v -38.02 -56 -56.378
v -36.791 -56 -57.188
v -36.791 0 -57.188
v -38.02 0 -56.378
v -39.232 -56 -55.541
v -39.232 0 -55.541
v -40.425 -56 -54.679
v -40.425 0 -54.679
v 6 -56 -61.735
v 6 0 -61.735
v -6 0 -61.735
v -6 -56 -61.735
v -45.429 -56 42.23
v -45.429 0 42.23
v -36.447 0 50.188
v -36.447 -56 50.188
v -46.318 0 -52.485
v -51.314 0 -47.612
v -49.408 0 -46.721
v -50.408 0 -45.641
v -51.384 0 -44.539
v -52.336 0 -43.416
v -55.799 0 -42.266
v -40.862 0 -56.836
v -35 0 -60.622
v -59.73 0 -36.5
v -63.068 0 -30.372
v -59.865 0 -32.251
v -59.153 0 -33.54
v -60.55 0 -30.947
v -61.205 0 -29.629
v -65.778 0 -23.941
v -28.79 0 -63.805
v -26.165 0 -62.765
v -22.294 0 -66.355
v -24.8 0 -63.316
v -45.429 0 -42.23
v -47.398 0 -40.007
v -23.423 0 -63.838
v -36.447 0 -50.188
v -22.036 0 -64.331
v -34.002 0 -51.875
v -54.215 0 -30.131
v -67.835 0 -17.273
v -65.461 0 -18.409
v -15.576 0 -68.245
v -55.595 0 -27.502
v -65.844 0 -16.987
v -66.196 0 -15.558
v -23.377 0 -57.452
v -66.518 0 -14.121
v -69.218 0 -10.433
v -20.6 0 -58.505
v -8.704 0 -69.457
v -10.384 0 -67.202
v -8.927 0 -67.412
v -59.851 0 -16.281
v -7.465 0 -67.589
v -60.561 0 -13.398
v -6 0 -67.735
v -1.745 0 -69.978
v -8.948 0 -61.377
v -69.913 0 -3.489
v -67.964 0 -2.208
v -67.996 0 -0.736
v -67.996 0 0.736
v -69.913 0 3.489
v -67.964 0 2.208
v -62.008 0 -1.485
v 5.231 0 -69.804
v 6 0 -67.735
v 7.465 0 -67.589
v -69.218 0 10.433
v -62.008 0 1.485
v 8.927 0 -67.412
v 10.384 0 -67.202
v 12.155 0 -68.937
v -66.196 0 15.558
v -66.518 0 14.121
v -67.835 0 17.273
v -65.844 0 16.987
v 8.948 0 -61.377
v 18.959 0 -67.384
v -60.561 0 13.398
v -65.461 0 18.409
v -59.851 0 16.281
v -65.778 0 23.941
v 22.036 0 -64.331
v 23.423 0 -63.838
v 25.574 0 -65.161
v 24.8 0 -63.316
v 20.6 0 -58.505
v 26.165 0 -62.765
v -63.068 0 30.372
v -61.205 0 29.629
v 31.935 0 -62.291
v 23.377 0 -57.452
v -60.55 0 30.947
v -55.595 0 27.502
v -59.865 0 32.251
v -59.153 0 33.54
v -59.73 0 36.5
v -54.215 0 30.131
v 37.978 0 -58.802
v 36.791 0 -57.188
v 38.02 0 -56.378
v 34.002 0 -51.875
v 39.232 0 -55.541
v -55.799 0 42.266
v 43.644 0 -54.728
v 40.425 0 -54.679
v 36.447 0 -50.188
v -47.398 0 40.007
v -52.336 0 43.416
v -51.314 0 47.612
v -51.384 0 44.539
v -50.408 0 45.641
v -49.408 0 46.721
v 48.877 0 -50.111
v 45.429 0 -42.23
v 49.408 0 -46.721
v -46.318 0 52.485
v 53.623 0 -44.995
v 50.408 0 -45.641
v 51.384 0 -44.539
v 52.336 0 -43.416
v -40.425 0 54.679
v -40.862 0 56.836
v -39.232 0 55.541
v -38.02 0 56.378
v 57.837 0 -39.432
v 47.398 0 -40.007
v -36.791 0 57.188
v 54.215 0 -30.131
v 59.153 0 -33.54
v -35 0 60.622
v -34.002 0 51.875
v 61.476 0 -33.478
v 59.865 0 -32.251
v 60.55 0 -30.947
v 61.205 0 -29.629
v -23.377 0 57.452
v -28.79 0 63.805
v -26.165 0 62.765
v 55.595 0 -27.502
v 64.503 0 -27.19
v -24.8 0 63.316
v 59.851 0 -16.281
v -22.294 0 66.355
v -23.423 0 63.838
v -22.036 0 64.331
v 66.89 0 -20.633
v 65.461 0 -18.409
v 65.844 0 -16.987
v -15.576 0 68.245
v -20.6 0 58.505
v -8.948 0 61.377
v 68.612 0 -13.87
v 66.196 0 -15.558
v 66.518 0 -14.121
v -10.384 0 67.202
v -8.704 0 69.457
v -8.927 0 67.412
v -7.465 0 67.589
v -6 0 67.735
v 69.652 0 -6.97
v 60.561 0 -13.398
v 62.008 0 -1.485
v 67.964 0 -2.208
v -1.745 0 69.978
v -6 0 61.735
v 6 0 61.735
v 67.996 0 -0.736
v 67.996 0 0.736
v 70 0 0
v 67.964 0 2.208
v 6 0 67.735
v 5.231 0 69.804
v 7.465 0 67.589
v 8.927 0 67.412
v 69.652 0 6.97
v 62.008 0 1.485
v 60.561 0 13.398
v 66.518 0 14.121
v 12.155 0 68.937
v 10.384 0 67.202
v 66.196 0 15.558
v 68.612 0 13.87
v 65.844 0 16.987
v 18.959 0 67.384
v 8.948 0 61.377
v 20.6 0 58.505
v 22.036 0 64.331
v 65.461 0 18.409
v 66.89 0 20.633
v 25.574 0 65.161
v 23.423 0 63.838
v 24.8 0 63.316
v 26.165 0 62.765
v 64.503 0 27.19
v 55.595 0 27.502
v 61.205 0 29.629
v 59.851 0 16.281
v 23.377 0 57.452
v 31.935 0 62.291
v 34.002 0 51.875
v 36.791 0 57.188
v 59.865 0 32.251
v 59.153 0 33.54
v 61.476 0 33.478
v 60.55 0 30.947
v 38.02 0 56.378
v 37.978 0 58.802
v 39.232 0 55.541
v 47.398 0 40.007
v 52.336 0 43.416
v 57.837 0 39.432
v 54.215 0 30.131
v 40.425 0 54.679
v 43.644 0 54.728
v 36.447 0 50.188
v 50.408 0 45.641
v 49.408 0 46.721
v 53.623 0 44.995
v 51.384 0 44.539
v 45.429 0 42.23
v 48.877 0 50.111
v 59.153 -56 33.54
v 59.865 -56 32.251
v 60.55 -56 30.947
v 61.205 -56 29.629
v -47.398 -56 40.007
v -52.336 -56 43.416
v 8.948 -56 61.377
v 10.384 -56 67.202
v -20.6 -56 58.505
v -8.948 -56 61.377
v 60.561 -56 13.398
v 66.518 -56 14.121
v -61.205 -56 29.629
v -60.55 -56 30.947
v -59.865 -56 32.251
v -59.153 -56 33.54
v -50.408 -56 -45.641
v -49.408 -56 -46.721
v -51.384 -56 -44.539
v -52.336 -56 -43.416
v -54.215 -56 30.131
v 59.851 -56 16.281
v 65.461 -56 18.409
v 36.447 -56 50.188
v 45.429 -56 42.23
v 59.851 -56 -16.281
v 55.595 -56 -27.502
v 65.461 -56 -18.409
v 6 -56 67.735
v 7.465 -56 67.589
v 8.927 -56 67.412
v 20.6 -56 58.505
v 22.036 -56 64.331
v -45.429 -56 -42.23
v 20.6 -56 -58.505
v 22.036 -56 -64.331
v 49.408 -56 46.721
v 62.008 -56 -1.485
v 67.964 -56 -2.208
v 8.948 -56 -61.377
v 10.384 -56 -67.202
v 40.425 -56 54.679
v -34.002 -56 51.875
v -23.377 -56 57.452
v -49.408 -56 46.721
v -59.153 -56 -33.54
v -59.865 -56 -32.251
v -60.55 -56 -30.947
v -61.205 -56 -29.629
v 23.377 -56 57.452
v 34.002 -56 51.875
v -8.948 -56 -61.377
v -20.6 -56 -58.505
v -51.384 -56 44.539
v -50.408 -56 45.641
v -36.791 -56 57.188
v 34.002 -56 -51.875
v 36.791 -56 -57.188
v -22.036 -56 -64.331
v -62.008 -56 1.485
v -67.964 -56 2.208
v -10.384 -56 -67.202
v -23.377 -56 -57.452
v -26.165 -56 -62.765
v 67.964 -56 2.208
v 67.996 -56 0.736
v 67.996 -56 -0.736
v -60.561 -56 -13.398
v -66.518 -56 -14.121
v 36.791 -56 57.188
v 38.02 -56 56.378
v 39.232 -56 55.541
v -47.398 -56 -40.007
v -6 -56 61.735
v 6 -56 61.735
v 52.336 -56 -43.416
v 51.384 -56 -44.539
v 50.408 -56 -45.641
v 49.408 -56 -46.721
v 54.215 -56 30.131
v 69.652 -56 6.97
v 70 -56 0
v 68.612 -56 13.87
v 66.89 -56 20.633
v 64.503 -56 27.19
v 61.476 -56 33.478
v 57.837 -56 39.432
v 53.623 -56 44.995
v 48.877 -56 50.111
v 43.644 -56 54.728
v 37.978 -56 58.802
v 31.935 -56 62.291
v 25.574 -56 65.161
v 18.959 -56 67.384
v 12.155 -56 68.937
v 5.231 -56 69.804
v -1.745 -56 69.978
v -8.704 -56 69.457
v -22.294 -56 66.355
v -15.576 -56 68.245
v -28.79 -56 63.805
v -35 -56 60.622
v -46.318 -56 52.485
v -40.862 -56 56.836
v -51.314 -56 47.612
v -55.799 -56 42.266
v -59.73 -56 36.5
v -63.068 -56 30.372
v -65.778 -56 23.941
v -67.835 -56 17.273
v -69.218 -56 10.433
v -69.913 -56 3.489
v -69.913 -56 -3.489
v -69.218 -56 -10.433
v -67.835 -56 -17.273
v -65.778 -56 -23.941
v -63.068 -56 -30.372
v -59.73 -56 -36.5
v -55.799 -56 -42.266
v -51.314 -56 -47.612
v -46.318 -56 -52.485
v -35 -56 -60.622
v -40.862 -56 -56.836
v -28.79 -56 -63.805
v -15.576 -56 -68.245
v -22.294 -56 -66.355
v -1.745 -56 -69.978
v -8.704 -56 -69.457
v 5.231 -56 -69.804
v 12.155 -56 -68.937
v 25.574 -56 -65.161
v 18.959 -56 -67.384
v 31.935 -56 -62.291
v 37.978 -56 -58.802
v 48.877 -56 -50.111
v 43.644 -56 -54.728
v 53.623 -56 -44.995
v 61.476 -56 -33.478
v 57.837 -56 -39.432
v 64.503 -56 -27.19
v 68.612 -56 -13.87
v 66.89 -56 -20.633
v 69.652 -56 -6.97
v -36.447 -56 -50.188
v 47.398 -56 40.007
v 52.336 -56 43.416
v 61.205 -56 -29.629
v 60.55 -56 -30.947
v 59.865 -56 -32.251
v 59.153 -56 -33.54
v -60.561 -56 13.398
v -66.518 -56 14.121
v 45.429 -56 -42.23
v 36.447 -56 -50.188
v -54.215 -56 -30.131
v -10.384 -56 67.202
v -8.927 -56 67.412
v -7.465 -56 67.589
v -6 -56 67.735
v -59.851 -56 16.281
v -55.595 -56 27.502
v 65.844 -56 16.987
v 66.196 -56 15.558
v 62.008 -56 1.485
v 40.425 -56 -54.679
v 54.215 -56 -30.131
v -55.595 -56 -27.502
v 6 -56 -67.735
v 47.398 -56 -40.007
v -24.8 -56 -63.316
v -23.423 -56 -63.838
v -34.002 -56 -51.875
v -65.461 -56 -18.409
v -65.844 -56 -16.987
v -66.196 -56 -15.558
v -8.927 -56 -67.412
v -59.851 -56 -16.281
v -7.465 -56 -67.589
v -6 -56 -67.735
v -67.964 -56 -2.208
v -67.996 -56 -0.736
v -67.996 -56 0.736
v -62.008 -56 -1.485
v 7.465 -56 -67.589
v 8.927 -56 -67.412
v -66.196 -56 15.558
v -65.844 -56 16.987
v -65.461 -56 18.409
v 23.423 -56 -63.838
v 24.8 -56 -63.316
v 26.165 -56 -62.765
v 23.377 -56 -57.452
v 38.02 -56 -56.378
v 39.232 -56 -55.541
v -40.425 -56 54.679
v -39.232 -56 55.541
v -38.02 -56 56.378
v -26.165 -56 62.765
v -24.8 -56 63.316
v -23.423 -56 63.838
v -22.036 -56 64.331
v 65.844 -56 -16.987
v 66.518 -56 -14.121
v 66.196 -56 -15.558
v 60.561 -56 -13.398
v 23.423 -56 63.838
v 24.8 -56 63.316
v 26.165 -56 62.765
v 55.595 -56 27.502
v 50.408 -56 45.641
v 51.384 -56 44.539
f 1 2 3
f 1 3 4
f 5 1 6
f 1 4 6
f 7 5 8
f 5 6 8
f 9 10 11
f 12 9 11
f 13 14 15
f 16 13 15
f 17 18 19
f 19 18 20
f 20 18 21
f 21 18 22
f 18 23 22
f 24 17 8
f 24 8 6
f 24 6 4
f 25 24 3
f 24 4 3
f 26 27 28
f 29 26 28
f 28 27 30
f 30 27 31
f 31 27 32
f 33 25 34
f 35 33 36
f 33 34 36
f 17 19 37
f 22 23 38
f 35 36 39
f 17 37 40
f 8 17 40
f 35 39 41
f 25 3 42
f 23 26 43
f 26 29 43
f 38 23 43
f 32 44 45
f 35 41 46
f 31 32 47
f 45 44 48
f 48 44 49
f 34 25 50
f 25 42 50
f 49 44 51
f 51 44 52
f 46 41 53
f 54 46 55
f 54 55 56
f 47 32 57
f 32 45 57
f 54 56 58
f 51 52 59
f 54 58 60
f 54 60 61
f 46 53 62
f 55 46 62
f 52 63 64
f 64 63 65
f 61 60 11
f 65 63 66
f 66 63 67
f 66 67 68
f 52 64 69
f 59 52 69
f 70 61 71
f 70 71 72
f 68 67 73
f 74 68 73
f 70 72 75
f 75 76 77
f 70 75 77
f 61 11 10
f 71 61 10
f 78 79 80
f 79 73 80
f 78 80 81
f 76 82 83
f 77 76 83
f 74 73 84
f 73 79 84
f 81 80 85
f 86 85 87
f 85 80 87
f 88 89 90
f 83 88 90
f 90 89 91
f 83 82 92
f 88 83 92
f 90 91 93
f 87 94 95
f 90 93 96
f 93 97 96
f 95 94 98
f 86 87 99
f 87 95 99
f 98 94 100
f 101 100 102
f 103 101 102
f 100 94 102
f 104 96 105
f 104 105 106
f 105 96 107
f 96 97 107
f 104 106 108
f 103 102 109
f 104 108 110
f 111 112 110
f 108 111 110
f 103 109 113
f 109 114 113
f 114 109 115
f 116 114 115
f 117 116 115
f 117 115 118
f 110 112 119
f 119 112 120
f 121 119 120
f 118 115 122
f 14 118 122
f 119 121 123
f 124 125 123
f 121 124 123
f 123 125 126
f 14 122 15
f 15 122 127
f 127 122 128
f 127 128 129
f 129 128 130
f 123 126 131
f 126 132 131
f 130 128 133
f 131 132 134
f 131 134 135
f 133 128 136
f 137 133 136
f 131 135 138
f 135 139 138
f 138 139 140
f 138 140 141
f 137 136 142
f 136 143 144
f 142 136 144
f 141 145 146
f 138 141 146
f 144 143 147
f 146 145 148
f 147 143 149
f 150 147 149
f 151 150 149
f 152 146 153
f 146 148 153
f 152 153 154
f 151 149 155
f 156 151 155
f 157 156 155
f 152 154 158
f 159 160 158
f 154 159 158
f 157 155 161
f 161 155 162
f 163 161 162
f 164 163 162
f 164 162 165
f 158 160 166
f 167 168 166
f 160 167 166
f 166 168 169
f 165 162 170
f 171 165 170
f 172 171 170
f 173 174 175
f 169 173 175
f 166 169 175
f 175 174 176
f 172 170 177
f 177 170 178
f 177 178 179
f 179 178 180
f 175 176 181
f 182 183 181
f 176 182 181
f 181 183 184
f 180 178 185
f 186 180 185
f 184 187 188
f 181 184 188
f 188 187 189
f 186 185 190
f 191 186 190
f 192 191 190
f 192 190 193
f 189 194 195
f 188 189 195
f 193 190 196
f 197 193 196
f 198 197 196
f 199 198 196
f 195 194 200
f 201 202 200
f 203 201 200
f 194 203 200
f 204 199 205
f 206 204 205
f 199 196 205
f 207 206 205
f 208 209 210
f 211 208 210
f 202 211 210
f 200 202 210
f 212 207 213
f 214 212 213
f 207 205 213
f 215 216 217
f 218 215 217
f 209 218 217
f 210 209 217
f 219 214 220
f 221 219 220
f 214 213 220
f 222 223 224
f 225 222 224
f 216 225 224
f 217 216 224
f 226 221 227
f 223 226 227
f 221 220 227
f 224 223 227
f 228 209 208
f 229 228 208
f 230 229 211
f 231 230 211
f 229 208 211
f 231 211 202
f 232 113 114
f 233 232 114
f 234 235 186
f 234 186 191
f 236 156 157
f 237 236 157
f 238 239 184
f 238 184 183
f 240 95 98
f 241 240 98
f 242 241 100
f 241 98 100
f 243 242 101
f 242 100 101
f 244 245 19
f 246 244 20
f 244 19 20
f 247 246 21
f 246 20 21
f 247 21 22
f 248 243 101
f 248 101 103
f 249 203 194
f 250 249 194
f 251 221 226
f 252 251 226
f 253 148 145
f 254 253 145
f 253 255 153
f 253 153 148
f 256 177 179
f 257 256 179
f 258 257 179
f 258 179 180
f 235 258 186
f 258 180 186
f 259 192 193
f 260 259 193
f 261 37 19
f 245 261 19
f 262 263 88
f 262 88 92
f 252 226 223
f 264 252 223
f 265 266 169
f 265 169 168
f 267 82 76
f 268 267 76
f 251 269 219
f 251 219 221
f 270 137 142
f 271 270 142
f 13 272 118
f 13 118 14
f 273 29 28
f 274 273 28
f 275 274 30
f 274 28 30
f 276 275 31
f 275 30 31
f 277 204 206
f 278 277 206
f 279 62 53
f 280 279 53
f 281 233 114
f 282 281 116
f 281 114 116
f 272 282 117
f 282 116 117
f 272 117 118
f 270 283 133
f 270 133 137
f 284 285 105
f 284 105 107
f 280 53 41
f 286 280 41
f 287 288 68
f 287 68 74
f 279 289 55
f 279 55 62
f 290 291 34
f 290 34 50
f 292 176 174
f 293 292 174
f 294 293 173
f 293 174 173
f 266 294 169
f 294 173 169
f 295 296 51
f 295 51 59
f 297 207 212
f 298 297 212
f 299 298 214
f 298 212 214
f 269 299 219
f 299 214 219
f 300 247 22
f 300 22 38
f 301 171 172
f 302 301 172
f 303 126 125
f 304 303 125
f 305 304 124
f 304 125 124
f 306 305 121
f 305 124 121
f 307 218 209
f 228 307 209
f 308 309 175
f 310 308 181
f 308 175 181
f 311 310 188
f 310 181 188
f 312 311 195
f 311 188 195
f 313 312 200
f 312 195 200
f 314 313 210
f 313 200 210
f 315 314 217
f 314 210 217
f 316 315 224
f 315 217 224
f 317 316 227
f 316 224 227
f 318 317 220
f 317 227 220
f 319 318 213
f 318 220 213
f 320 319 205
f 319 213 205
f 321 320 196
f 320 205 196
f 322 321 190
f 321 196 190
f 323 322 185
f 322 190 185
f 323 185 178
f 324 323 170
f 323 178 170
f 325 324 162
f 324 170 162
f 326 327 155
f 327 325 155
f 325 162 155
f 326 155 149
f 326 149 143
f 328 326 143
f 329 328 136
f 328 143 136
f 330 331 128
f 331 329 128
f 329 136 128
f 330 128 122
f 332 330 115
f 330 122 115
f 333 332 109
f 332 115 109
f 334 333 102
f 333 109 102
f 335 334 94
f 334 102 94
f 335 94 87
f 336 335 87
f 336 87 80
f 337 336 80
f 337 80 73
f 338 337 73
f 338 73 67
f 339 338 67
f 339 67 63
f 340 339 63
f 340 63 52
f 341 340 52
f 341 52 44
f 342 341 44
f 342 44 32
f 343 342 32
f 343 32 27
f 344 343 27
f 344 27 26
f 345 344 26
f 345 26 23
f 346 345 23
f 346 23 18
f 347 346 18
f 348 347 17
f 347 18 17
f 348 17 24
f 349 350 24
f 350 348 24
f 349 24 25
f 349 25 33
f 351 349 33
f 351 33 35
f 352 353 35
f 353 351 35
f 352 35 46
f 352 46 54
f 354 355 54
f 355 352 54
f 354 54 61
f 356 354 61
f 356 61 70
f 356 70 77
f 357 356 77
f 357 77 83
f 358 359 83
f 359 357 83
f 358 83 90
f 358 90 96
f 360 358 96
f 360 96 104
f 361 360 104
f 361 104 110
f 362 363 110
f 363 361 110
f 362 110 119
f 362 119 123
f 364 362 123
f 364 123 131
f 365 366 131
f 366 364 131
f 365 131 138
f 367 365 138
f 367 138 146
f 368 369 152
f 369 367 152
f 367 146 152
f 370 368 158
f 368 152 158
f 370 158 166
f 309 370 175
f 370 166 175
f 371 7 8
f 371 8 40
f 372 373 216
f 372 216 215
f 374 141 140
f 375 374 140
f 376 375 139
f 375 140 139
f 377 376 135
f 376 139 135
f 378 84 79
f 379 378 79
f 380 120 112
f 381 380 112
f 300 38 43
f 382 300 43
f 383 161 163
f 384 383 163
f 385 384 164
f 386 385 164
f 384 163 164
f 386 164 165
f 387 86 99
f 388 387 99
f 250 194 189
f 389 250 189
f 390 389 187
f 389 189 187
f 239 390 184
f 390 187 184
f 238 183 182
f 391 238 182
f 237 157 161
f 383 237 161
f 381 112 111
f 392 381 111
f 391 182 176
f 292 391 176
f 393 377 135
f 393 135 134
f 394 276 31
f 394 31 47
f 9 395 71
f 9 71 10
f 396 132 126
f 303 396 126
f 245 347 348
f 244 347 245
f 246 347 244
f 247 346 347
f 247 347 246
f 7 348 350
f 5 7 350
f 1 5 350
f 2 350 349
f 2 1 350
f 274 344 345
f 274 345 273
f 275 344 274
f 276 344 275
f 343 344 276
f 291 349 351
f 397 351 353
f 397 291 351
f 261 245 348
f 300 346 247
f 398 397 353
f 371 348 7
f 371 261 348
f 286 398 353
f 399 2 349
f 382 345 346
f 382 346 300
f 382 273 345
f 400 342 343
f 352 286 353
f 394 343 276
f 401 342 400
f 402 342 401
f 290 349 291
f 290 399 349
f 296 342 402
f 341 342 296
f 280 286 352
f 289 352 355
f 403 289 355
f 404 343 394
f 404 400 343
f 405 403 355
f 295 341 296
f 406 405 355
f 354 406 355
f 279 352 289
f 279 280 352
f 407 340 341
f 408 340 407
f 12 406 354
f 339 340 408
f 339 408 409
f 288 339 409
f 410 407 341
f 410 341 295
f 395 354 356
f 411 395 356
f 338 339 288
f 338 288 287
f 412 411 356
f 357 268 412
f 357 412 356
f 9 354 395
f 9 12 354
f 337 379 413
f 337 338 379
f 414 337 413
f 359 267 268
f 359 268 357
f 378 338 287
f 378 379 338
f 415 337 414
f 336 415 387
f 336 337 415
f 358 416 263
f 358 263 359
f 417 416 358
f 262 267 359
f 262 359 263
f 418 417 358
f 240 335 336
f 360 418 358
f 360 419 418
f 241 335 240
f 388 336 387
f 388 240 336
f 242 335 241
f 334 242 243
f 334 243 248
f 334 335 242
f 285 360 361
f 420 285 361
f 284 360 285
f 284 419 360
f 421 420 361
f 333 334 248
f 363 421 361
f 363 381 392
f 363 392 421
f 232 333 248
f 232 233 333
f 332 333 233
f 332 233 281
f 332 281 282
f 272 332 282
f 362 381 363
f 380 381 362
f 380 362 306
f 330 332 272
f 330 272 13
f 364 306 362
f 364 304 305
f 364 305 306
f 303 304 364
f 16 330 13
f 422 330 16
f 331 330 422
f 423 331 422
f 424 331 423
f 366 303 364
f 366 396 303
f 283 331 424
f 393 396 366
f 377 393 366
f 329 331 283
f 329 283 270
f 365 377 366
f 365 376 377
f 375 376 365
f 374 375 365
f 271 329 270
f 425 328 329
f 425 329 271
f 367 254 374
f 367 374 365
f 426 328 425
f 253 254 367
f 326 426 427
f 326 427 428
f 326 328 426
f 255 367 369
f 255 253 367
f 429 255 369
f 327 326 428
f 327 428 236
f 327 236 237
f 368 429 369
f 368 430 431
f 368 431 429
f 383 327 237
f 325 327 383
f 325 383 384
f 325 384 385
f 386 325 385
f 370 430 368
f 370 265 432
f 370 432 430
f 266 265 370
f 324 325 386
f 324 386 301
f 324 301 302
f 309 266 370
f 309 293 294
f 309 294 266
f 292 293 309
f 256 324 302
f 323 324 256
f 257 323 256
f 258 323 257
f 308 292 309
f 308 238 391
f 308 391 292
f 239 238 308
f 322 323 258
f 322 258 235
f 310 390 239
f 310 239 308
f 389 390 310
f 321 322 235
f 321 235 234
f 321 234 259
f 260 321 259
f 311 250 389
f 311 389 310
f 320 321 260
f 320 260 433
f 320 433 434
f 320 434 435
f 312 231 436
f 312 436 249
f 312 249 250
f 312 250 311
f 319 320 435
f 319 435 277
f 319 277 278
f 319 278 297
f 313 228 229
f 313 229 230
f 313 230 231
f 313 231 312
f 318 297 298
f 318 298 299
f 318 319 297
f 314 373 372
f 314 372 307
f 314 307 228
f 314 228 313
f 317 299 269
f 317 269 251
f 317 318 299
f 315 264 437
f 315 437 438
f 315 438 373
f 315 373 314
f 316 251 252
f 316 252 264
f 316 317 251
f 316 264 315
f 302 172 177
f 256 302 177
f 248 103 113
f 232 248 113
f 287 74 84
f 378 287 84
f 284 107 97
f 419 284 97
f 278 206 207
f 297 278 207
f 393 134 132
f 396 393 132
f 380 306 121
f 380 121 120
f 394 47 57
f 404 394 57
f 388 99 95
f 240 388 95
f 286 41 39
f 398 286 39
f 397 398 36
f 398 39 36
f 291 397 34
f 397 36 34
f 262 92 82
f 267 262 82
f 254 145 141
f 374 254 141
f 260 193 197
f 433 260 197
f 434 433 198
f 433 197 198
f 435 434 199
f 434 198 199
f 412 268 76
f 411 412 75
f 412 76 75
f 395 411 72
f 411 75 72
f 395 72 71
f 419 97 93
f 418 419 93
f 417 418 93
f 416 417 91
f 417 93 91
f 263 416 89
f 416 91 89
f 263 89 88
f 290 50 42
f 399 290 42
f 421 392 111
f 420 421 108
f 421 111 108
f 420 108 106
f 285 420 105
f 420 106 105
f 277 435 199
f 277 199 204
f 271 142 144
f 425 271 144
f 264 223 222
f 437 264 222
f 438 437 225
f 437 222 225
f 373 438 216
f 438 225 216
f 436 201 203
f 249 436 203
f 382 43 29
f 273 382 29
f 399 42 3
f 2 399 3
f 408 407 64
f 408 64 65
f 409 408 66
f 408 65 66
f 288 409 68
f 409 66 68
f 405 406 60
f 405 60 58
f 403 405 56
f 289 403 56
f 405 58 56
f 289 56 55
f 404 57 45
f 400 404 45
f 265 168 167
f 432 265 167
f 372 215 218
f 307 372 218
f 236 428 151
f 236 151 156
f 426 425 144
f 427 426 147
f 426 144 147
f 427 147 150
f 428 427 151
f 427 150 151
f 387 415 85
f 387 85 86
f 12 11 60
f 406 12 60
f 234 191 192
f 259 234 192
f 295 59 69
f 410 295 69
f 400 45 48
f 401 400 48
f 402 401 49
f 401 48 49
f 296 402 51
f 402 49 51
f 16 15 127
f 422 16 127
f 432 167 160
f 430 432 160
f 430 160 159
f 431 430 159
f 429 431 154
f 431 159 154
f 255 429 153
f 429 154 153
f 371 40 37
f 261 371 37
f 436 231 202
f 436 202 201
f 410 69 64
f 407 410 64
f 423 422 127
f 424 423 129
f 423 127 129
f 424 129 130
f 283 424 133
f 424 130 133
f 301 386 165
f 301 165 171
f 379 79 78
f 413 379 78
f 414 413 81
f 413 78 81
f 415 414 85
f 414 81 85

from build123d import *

# Parameters (mm, degrees)
F0_R     = 70
F1_DEPTH = 56
F2_COUNT = 26


with BuildPart() as f1:
    # F0 (on Front) → F1 (new body)
    with BuildSketch(Plane.XZ):
        Circle(F0_R)
        with BuildLine():
            ThreePointArc((6, 67.7347768875), (0, -68), (-6, 67.7347768875))
            Line((-6, 67.7347768875), (-6, 61.7347768875))
            Line((-6, 61.7347768875), (6, 61.7347768875))
            Line((6, 61.7347768875), (6, 67.7347768875))
        make_face(mode=Mode.SUBTRACT)
    extrude(amount=F1_DEPTH)

    # F2: F1 ×26 about axis
    f2_axis = Axis((0, 0, 0), (0, 1, 0))


with BuildPart() as f1_1:
    add(f1.part)
    for i in range(1, F2_COUNT):
        add(f1.part.rotate(f2_axis, i * 360 / F2_COUNT))


solid = f1_1.part
